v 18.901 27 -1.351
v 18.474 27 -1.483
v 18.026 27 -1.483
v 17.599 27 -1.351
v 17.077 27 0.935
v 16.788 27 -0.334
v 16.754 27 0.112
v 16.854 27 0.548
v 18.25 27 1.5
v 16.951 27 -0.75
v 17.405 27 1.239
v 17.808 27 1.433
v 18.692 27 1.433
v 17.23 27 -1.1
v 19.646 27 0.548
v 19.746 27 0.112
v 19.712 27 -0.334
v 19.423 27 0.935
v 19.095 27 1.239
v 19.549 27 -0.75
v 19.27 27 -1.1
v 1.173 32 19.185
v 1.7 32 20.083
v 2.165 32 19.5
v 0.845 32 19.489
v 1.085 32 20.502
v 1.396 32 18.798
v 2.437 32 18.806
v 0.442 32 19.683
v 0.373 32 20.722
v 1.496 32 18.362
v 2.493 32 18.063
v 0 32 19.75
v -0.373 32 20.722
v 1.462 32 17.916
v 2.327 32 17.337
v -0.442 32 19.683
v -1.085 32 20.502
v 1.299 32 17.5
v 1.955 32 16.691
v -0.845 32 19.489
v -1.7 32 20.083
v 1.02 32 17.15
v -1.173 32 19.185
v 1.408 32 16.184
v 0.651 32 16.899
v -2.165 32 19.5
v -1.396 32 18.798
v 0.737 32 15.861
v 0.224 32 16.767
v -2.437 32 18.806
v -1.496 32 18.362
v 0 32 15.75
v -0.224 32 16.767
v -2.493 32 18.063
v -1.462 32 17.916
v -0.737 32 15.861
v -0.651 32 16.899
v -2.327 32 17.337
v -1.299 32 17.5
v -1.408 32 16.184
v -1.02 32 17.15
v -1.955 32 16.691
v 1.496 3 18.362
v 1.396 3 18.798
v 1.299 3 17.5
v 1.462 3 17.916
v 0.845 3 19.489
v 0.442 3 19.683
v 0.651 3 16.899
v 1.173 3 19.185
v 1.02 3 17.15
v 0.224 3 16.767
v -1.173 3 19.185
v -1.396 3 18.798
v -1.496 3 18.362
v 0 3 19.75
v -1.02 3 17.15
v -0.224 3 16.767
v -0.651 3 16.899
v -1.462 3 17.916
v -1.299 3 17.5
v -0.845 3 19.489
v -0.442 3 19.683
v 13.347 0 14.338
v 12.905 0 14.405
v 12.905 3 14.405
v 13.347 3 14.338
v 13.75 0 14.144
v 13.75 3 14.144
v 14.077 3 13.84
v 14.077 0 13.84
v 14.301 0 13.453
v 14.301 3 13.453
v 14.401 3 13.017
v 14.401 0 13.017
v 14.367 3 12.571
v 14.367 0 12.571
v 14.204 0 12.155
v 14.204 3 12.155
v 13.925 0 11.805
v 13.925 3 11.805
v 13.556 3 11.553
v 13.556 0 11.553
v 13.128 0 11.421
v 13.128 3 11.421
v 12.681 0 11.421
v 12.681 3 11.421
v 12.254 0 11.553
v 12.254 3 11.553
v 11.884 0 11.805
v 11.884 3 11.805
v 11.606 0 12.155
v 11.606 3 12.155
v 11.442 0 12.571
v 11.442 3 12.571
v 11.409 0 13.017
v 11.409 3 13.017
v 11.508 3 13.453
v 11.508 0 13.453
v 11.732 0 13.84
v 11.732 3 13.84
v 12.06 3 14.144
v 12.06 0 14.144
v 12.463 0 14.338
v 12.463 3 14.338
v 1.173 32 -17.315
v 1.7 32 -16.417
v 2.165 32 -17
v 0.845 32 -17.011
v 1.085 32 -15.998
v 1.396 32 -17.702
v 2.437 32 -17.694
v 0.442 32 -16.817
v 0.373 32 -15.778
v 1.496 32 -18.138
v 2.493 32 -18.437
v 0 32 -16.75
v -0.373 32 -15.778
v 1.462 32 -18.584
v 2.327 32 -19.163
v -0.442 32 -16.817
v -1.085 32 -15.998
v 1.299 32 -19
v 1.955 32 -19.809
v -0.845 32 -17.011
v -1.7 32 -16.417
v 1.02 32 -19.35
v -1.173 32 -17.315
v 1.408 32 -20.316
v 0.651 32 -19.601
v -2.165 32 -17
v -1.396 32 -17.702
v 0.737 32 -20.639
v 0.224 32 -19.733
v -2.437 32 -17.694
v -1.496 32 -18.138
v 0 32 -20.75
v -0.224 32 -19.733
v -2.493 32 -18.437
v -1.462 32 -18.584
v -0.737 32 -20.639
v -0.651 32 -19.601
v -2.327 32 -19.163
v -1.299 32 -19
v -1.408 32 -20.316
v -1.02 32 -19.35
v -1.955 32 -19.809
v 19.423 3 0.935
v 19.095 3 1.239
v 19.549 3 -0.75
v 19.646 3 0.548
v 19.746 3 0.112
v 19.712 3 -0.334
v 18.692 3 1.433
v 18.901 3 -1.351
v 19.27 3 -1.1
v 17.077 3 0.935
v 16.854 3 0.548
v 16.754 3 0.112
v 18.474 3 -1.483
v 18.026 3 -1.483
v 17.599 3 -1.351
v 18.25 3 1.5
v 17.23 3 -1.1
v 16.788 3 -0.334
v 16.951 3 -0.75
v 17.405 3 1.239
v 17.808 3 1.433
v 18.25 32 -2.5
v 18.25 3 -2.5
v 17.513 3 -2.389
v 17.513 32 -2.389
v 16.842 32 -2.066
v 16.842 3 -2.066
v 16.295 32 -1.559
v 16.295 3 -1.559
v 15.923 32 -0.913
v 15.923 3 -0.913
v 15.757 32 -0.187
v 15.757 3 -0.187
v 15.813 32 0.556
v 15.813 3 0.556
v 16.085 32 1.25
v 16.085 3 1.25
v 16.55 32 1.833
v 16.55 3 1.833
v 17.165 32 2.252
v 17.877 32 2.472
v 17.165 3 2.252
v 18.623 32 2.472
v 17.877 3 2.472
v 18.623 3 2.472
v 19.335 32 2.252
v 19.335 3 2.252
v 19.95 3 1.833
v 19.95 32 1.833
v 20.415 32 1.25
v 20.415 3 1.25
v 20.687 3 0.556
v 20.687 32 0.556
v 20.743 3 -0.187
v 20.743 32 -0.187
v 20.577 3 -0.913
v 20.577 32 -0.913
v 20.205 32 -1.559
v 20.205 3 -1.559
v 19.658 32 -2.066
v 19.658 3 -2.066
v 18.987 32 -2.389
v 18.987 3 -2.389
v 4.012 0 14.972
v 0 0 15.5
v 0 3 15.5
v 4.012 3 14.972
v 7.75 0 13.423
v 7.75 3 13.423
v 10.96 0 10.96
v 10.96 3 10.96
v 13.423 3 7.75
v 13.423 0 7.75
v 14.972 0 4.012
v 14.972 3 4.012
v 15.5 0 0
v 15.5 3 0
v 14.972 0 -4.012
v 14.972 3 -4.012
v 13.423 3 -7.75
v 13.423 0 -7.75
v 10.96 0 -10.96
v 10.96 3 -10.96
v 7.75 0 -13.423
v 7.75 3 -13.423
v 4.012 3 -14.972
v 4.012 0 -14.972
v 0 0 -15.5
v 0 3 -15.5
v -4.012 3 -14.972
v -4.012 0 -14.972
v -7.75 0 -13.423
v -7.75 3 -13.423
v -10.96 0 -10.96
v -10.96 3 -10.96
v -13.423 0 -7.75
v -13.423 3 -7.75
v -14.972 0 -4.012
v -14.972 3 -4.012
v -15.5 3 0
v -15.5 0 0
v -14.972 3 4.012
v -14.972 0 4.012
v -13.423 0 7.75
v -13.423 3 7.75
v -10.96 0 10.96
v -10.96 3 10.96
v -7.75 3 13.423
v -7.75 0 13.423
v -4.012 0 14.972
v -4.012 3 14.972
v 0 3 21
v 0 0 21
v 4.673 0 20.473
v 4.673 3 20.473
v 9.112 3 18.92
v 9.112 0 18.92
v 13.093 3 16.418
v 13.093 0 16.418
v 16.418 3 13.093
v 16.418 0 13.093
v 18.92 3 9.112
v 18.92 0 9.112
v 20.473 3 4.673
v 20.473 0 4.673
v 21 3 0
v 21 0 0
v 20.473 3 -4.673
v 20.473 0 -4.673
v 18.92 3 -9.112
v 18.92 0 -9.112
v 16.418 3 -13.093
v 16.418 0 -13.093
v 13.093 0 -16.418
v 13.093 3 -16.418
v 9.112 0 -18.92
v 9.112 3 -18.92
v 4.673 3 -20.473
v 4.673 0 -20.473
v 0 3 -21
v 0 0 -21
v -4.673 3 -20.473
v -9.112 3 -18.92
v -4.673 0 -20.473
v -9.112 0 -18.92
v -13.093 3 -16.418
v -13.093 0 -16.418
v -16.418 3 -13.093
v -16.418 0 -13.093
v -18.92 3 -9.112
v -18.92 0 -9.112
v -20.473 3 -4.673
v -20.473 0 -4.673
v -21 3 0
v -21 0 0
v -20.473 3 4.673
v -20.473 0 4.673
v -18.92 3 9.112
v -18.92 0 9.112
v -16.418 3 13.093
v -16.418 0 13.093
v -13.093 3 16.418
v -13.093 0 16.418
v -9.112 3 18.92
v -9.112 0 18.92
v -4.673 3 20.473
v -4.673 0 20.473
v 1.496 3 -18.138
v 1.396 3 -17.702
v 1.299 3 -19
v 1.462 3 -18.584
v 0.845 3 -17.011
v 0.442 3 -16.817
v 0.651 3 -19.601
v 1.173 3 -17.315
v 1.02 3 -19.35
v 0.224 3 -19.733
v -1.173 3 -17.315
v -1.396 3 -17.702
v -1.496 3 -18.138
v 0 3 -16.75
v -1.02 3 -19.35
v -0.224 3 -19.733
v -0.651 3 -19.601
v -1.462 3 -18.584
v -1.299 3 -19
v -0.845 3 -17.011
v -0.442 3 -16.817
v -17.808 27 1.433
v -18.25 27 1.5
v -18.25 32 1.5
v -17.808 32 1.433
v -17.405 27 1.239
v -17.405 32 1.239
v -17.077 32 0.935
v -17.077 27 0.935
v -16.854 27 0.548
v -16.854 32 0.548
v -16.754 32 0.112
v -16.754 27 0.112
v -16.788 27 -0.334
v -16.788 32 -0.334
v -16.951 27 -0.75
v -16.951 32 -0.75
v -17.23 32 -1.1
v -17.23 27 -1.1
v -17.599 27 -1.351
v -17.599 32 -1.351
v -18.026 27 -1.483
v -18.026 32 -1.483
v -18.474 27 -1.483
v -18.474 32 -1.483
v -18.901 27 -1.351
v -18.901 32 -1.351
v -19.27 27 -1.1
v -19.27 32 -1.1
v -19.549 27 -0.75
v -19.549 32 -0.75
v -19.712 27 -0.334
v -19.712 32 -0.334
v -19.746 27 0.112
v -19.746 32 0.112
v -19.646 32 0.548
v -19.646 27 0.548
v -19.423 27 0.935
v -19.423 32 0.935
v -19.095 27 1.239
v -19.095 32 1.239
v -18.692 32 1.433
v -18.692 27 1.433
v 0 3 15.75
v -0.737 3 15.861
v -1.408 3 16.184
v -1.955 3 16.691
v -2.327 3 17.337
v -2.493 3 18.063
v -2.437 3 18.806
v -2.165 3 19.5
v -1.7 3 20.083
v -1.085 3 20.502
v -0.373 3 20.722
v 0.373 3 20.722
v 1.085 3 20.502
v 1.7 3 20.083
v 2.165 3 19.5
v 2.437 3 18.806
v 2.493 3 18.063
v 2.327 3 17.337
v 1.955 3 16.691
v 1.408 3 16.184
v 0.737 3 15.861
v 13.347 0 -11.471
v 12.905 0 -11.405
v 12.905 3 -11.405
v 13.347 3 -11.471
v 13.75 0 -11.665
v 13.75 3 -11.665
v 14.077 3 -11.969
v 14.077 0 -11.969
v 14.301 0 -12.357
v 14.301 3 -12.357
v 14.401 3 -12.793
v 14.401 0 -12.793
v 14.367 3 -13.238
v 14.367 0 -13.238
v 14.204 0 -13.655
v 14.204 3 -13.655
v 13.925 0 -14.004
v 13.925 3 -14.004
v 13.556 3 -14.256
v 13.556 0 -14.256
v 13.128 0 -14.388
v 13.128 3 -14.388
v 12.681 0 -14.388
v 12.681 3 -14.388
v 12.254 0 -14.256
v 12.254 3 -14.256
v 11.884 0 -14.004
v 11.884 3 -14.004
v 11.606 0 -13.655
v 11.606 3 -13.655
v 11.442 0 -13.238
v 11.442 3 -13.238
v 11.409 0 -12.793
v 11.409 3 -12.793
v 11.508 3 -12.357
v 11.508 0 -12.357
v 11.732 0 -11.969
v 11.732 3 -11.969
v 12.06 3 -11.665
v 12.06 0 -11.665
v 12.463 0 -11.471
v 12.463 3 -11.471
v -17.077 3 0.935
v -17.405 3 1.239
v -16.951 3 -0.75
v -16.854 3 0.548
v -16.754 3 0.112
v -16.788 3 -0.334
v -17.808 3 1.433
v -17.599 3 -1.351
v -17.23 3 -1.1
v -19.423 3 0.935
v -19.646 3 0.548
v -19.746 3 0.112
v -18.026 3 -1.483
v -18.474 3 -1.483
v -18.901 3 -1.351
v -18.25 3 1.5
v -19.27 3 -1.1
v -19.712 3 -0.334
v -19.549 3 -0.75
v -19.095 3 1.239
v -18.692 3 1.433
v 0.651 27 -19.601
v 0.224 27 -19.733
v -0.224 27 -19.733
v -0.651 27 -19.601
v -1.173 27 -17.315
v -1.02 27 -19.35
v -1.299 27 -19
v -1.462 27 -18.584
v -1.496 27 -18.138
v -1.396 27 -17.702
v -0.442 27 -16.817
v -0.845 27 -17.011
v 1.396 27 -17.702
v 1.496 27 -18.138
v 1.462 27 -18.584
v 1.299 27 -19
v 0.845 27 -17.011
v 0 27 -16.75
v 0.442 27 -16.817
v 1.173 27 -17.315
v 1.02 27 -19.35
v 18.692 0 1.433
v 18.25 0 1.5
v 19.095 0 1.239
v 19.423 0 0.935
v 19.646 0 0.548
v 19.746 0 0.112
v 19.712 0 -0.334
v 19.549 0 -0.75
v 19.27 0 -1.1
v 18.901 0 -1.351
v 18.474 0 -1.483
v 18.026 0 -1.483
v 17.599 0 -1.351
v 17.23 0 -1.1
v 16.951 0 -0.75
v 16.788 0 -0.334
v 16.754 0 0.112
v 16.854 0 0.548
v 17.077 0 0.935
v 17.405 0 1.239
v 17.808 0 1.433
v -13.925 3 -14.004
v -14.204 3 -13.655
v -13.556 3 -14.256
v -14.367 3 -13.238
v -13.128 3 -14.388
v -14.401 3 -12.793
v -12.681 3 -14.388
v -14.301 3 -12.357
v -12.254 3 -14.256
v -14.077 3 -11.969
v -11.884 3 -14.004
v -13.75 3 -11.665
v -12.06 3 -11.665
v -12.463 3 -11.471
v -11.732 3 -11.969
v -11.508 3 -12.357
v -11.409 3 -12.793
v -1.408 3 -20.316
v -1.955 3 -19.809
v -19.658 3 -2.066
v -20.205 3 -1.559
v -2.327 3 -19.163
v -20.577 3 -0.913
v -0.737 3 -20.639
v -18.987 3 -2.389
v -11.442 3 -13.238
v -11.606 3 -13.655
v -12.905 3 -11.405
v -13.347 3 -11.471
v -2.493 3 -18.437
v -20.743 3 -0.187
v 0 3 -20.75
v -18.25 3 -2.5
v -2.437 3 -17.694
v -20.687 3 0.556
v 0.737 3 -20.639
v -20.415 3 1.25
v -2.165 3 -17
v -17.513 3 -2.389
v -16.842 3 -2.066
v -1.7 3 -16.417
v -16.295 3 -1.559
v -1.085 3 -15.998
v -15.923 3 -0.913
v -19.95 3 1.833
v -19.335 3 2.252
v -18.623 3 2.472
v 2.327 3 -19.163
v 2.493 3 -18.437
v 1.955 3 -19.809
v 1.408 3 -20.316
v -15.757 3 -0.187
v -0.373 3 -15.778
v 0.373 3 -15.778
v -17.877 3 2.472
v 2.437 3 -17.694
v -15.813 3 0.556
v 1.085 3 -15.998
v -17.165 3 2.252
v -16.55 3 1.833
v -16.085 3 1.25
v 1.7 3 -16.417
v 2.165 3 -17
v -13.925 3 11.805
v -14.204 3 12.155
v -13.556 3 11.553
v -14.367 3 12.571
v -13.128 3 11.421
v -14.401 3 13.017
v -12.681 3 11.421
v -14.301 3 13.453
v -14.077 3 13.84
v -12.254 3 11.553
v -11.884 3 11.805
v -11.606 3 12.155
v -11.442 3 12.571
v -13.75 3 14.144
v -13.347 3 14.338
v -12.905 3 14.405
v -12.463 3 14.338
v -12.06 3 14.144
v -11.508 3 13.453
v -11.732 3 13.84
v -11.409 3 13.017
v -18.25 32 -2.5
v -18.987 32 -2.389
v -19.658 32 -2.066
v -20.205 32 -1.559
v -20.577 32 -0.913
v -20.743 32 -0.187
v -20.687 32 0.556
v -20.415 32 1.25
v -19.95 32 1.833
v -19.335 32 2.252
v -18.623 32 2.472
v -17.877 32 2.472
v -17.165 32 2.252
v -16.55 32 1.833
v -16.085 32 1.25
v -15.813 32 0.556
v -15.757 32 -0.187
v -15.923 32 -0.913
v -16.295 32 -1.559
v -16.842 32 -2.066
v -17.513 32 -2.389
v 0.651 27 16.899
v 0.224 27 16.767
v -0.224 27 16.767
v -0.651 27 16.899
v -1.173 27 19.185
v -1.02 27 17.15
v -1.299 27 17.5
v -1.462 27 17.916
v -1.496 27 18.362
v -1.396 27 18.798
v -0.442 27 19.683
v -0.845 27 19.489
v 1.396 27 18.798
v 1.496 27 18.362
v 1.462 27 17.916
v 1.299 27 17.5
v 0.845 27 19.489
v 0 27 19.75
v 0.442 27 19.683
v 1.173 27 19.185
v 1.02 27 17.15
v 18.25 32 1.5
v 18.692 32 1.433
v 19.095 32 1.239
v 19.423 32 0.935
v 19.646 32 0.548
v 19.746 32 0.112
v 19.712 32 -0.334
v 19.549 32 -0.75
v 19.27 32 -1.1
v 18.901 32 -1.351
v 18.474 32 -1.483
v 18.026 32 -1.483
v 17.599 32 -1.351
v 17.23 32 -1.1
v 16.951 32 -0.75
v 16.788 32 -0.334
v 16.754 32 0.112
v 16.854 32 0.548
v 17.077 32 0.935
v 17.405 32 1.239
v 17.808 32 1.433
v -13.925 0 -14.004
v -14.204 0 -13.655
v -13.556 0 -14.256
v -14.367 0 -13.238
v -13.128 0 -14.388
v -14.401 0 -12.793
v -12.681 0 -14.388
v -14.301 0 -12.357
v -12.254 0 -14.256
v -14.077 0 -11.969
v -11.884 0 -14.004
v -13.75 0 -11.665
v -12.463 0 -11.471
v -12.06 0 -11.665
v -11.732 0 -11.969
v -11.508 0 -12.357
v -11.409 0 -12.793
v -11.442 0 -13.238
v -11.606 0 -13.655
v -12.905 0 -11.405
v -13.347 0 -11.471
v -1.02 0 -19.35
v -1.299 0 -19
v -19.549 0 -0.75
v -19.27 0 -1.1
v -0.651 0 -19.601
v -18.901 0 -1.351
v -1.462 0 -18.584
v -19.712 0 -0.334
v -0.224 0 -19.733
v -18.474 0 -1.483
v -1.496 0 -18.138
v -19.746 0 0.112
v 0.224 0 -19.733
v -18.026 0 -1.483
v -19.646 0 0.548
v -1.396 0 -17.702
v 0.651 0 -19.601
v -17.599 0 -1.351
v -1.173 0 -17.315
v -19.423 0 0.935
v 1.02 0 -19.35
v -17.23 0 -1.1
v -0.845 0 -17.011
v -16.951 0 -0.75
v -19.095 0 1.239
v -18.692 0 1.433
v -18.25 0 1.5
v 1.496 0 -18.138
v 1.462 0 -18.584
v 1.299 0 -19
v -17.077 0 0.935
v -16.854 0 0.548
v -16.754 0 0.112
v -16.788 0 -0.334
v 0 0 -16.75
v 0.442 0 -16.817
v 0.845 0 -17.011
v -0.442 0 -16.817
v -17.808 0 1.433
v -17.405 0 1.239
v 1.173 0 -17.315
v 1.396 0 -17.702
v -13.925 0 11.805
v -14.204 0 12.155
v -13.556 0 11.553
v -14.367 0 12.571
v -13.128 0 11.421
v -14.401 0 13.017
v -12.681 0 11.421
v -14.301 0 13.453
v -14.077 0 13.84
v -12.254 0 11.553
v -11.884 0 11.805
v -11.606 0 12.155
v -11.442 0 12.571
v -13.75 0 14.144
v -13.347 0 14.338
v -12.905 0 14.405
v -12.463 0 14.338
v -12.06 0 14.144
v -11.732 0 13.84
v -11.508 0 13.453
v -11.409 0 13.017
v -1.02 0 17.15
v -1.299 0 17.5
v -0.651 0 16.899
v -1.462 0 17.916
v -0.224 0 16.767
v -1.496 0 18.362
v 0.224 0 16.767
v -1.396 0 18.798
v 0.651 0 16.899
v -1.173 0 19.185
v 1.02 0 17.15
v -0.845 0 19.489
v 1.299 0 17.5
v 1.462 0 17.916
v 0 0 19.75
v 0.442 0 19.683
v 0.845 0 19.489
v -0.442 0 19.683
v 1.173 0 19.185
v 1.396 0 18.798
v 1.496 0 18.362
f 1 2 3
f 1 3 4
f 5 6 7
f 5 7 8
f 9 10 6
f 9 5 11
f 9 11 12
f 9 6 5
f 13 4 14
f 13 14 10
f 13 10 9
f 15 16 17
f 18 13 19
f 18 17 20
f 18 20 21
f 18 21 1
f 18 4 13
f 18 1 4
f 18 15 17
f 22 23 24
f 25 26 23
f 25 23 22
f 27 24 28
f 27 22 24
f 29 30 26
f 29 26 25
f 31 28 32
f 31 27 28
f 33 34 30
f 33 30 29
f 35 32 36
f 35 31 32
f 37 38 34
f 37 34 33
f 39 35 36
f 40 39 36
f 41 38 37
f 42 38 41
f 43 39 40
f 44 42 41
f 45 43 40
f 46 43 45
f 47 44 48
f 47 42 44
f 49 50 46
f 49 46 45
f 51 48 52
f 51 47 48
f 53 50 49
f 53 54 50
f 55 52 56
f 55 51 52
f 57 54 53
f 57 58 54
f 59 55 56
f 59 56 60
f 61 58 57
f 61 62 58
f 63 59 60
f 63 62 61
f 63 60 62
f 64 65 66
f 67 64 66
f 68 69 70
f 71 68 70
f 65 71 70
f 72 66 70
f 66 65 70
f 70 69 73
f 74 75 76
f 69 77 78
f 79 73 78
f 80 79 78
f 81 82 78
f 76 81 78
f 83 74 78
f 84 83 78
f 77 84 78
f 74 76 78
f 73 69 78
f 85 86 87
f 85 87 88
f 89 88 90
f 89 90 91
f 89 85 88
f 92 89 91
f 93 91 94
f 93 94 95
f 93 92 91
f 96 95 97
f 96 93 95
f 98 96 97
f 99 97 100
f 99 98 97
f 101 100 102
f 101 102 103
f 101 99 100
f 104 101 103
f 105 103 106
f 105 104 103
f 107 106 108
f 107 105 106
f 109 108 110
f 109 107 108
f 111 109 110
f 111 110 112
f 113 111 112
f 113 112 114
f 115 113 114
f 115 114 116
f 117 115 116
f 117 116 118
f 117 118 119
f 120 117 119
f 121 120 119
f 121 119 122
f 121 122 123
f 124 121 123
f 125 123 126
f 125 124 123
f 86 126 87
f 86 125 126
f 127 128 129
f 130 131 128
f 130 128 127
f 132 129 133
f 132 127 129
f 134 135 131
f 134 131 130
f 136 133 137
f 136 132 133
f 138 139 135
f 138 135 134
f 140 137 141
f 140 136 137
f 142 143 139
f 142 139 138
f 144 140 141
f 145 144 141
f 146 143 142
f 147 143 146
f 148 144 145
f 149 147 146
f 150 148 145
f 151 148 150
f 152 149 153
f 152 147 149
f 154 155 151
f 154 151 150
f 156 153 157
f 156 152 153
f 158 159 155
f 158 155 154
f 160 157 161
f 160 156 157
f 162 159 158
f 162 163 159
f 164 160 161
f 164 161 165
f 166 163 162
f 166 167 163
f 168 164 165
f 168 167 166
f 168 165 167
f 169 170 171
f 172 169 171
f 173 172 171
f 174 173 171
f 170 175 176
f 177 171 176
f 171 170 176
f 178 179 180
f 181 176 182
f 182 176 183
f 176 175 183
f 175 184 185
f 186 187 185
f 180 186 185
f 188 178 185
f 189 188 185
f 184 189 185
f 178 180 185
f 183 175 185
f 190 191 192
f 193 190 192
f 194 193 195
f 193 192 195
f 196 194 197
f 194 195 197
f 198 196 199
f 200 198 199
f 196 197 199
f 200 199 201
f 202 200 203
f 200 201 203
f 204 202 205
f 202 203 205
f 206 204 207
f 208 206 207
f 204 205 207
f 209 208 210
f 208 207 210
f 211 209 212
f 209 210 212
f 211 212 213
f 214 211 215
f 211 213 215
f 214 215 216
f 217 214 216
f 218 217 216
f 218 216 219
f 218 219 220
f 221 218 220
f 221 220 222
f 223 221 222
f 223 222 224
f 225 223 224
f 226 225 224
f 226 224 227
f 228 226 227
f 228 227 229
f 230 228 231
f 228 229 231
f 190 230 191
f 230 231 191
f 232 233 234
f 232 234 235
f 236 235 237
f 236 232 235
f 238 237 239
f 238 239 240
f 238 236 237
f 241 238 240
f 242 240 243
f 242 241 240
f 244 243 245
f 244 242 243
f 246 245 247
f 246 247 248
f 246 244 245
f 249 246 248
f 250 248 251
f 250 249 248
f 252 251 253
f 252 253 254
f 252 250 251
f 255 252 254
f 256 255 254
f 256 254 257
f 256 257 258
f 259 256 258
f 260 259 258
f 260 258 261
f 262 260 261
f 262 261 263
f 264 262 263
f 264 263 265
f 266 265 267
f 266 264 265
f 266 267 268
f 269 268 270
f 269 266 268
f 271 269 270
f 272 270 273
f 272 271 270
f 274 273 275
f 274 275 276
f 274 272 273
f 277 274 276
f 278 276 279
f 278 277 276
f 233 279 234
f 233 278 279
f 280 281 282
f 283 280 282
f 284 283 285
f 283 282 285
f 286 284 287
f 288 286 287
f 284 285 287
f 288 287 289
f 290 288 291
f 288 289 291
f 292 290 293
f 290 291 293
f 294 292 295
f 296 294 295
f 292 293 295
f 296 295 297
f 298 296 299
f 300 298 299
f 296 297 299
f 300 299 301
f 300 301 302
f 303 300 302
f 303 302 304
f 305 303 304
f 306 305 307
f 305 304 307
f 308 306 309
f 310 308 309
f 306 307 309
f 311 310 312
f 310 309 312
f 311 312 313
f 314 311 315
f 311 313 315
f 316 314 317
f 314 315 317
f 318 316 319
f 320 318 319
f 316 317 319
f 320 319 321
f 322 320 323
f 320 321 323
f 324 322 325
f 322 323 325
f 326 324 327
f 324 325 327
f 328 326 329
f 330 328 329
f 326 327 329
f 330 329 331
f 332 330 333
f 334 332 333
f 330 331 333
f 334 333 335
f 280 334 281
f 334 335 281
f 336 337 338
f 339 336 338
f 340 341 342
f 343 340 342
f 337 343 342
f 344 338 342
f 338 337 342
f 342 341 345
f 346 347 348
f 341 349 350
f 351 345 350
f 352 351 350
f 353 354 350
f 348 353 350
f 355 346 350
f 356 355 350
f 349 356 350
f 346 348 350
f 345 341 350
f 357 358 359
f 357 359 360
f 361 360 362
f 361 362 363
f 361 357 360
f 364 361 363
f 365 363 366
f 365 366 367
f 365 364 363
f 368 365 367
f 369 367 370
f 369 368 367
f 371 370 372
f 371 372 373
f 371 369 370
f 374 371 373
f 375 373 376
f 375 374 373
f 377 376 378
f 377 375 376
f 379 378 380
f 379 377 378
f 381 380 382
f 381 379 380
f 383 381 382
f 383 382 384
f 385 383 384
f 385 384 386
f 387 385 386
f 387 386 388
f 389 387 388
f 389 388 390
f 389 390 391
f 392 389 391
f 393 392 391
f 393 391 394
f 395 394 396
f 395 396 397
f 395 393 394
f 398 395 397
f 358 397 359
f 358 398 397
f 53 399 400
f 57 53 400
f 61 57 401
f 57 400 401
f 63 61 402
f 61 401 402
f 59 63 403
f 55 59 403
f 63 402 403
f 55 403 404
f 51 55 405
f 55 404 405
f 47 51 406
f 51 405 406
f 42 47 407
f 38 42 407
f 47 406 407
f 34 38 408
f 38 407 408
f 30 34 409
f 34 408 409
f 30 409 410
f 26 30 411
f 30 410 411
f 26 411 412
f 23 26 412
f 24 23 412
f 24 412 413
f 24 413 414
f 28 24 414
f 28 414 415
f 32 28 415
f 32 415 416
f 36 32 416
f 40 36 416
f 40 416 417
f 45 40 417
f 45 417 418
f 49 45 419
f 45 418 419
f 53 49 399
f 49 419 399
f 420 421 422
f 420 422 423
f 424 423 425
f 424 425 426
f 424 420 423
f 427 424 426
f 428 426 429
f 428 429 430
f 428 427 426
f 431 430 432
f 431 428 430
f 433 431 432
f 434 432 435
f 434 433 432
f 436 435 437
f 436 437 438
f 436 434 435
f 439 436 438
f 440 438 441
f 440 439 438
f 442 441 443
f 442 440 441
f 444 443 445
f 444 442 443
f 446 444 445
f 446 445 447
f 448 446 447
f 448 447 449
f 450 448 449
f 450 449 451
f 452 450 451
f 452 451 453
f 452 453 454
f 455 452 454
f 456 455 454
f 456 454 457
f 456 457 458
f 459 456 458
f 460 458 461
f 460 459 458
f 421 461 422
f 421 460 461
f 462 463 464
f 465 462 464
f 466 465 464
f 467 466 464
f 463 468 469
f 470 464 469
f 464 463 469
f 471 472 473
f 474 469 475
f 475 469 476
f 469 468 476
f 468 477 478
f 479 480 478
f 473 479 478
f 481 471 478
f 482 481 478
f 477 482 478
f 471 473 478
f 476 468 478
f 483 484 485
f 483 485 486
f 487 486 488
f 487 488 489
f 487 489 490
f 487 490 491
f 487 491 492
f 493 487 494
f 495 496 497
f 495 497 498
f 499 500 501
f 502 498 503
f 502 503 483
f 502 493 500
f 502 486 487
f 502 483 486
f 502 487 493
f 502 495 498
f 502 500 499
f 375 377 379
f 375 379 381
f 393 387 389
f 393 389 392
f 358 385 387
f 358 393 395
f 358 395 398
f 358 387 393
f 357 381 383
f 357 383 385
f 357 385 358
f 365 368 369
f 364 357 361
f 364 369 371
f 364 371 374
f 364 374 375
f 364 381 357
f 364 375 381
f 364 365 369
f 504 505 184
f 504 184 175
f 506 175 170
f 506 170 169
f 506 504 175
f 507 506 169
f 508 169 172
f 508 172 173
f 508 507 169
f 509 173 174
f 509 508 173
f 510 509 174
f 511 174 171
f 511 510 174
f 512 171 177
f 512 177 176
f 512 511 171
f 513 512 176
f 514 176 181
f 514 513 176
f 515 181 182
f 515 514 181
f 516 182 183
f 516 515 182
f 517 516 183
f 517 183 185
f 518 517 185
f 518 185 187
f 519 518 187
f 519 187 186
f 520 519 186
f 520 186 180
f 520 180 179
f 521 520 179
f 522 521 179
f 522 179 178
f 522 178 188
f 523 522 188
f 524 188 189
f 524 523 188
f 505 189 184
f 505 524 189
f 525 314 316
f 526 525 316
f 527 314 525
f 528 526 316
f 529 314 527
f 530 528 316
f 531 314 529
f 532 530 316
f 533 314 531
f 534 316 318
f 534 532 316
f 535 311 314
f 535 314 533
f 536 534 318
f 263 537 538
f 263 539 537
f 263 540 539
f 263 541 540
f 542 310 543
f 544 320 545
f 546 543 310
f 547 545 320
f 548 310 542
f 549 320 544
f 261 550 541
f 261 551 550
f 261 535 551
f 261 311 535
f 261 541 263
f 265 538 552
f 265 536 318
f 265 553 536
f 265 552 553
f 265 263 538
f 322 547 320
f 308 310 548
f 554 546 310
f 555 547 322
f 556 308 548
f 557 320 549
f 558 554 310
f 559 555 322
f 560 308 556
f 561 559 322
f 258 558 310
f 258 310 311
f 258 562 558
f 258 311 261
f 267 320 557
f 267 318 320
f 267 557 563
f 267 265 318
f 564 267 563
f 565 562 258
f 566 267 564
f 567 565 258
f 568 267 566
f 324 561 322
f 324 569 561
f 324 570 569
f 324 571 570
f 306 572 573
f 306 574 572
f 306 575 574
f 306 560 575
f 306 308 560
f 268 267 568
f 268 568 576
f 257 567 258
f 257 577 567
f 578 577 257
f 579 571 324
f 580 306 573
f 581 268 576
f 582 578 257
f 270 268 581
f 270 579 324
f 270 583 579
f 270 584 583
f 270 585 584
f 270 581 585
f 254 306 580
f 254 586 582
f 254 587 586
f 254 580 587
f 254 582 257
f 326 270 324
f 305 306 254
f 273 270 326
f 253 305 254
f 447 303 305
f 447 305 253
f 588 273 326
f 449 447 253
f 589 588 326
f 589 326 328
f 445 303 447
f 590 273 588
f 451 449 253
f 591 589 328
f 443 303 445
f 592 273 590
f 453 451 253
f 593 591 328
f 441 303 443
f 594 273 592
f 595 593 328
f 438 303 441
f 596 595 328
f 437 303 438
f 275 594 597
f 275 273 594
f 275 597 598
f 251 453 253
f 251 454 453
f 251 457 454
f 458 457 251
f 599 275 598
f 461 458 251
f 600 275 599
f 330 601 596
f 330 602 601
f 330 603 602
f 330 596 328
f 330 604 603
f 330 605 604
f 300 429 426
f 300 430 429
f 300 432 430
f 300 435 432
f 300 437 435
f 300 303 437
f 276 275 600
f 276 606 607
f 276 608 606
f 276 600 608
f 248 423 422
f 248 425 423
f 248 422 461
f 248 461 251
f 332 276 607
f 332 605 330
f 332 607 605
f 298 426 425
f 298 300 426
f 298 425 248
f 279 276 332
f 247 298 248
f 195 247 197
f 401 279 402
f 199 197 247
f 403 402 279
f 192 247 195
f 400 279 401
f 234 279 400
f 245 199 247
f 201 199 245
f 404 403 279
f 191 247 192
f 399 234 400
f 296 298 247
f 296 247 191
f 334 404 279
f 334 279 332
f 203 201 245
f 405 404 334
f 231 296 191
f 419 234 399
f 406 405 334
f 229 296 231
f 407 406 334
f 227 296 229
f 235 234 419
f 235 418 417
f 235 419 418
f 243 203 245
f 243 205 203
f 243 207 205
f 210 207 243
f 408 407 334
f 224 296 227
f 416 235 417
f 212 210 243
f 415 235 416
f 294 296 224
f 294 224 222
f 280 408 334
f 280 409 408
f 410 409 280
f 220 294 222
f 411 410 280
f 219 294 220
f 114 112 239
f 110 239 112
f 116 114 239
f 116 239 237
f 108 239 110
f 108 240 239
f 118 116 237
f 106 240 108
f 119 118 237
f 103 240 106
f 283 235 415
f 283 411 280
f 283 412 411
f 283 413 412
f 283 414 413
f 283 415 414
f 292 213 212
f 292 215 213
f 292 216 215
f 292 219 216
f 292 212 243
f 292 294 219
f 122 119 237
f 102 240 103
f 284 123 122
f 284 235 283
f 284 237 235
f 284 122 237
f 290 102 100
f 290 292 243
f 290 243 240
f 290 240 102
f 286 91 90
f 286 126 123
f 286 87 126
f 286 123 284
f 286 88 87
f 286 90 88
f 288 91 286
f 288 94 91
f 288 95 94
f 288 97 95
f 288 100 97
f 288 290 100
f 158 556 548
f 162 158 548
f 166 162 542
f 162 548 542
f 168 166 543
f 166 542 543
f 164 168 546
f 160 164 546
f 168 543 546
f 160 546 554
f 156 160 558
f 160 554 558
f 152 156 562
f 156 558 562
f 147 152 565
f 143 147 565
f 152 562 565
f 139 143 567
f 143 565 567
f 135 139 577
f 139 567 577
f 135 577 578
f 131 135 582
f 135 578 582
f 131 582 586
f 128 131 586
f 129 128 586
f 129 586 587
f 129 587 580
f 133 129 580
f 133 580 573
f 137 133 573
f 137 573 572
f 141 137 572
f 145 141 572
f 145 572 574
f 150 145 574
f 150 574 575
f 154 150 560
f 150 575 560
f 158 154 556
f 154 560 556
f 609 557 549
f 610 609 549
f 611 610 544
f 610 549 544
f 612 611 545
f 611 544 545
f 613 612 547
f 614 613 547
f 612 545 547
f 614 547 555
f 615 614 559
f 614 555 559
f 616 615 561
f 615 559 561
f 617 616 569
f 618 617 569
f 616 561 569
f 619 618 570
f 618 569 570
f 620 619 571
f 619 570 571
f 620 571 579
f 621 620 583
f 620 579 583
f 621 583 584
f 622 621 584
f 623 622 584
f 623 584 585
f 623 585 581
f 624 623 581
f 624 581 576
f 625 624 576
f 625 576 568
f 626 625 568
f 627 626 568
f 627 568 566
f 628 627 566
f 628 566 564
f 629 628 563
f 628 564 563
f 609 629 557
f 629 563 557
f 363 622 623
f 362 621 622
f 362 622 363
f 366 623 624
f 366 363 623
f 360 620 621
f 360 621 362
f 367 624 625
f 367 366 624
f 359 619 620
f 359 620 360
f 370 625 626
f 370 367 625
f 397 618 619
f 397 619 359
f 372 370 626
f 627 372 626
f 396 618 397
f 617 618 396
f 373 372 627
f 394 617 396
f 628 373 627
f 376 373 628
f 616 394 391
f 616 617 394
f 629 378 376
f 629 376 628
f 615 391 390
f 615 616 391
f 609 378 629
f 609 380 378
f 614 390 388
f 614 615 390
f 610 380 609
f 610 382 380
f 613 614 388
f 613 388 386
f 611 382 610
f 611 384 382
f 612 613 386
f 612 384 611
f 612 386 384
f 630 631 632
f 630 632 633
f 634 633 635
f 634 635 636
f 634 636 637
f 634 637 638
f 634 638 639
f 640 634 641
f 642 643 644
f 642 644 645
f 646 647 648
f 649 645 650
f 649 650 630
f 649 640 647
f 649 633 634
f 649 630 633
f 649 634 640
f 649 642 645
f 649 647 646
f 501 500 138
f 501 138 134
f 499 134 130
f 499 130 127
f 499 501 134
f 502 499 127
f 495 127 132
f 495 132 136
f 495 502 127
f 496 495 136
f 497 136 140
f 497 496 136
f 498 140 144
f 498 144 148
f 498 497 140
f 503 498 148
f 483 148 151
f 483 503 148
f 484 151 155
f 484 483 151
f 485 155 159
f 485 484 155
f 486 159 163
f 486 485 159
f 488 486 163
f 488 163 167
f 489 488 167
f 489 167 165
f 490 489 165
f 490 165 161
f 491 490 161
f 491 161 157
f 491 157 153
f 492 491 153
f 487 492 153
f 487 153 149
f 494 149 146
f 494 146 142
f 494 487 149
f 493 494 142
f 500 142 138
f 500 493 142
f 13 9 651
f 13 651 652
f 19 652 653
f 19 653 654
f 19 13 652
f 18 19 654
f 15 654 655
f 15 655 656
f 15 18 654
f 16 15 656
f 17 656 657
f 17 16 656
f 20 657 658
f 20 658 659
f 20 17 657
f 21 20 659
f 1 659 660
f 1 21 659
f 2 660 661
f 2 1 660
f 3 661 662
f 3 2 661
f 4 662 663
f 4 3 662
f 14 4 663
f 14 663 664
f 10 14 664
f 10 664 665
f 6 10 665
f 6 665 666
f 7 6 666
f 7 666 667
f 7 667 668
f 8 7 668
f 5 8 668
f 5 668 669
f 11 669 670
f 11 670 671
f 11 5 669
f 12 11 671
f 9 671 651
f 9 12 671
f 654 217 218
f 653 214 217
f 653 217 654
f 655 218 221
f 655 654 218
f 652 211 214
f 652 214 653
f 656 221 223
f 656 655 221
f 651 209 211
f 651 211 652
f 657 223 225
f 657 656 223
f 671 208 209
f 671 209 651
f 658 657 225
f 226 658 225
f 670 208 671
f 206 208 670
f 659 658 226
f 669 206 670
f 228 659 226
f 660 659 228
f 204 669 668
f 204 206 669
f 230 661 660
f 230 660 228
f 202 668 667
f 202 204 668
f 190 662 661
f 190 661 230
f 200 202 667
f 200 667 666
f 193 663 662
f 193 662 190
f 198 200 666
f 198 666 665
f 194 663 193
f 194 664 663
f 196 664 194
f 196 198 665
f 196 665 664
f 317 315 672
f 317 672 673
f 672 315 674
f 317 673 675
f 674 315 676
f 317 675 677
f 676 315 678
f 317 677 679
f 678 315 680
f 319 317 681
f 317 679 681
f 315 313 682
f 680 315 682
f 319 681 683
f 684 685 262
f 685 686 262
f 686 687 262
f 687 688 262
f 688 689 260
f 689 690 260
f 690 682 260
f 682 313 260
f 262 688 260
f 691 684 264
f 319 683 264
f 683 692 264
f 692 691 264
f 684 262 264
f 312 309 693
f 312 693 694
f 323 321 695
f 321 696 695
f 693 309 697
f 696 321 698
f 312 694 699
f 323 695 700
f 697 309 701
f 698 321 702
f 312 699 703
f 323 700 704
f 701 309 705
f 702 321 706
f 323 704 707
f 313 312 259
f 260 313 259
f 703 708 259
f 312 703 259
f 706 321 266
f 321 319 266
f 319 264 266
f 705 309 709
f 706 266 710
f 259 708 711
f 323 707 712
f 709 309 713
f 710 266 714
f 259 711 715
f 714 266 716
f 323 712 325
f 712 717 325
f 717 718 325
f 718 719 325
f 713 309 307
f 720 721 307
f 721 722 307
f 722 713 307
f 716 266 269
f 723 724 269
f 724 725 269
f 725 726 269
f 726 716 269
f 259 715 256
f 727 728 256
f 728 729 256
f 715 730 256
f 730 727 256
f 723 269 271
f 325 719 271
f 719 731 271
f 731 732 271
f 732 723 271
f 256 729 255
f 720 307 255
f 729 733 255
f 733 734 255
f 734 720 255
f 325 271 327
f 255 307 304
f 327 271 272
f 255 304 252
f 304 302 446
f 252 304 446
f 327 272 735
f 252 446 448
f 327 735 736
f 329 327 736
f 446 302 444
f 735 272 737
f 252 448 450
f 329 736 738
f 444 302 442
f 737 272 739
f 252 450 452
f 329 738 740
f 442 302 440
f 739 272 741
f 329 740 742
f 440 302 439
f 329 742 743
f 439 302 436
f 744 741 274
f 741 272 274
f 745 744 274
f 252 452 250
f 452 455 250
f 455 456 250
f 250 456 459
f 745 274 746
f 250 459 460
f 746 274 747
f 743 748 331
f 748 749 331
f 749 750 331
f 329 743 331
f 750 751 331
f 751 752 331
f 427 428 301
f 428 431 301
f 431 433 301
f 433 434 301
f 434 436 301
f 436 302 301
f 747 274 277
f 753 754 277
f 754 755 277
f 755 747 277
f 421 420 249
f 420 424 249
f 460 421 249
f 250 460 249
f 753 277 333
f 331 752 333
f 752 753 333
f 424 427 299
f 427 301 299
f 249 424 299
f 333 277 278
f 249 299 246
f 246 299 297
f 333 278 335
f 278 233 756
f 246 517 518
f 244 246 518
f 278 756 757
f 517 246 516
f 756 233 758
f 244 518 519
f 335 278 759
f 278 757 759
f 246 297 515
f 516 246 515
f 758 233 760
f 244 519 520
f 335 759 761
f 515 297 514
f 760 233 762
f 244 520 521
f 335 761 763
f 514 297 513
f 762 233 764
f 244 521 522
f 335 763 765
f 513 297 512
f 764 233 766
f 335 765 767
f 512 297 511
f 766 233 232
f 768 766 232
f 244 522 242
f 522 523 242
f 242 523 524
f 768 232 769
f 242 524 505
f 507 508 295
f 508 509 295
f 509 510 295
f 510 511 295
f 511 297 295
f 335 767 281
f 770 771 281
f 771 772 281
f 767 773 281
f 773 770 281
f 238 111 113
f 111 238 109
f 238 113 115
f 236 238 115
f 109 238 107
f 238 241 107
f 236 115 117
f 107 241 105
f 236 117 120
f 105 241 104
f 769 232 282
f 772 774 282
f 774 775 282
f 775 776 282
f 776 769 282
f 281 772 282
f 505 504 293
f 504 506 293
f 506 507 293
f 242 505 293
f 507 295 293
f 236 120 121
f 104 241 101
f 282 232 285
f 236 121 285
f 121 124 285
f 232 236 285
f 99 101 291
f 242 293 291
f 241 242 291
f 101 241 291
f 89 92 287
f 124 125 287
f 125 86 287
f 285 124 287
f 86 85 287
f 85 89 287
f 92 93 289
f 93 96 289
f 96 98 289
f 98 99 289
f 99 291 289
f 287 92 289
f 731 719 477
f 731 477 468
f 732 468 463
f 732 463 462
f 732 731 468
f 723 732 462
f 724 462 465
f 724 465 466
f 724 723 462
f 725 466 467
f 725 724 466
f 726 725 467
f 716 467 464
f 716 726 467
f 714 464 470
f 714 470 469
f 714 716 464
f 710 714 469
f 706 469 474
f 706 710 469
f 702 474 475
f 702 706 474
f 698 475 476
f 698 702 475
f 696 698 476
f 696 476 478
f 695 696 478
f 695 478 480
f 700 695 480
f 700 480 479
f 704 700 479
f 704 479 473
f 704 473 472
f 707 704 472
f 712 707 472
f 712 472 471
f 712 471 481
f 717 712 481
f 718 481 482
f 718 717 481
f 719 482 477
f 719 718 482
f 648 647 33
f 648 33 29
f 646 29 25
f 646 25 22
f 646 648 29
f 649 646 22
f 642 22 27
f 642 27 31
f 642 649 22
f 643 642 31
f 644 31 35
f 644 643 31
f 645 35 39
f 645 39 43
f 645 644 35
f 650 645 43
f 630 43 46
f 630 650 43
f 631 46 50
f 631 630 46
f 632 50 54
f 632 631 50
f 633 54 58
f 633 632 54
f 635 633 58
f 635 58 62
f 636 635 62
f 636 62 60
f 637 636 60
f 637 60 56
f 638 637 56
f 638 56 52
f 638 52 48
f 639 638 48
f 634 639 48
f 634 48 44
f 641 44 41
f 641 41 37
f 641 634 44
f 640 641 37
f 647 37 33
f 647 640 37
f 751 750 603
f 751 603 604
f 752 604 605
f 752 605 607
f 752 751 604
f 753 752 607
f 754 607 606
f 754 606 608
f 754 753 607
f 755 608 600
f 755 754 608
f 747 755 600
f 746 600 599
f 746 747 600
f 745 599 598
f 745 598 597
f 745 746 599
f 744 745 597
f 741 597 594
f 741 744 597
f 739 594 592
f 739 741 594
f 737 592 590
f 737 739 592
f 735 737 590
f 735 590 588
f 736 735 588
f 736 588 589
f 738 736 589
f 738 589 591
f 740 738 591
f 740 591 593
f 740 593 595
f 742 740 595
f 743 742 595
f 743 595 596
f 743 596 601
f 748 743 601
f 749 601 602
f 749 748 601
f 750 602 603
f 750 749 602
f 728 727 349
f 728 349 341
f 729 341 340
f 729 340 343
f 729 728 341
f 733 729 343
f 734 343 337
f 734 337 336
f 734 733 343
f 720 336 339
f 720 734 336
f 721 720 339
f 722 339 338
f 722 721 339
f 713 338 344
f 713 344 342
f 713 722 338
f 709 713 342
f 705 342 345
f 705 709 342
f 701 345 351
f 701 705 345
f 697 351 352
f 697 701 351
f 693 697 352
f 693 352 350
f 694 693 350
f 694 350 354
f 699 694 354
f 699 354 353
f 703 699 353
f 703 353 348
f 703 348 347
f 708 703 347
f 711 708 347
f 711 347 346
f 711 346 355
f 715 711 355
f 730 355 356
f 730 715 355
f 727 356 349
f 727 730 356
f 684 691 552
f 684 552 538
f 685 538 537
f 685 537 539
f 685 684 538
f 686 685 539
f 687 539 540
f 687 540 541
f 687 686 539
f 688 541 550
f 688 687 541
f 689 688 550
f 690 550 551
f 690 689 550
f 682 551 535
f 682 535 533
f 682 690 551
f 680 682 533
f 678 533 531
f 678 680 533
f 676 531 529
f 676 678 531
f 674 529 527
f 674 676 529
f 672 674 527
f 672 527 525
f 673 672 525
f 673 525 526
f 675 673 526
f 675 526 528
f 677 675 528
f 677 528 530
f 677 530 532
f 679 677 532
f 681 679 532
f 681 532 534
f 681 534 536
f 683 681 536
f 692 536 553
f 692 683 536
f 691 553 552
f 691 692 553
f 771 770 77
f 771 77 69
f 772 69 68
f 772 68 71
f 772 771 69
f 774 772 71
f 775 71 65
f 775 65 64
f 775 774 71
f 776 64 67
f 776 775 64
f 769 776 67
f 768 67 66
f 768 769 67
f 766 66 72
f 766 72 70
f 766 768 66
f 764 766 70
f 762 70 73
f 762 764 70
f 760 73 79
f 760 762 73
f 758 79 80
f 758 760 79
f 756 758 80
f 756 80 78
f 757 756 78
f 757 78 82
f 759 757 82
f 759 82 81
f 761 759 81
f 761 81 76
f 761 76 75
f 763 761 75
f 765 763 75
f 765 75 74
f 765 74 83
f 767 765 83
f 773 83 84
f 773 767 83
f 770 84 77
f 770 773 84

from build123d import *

# Parameters (mm, degrees)
SKETCH1_R           = 21
SKETCH1_R_2         = 15.5
SKETCH1_R_3         = 1.5
BOSS_EXTRUDE1_DEPTH = 3
SKETCH2_R           = 2.5
BOSS_EXTRUDE2_DEPTH = 29
CUT_EXTRUDE1_START  = -5
SKETCH3_R           = 1.5
CUT_EXTRUDE1_DEPTH  = 5


with BuildPart() as part:
    # Sketch1 → Boss-Extrude1 (new body)
    with BuildSketch(Plane(origin=(0, 0, 0), x_dir=(1, 0, 0), z_dir=(0, 1, 0))):
        with Locations(Location((0, 0, 0), (0, 0, 270))):
            Circle(SKETCH1_R)
        with Locations(Location((0, 0, 0), (0, 0, 270))):
            Circle(SKETCH1_R_2, mode=Mode.SUBTRACT)
        with Locations(Location((0, 18.25, 0), (0, 0, 270))):
            Circle(SKETCH1_R_3, mode=Mode.SUBTRACT)
        with Locations(Location((12.904698757, 12.904698757, 0), (0, 0, 270))):
            Circle(SKETCH1_R_3, mode=Mode.SUBTRACT)
        with Locations(Location((18.25, 0, 0), (0, 0, 270))):
            Circle(SKETCH1_R_3, mode=Mode.SUBTRACT)
        with Locations(Location((12.904698757, -12.904698757, 0), (0, 0, 270))):
            Circle(SKETCH1_R_3, mode=Mode.SUBTRACT)
        with Locations(Location((0, -18.25, 0), (0, 0, 270))):
            Circle(SKETCH1_R_3, mode=Mode.SUBTRACT)
        with Locations(Location((-12.904698757, -12.904698757, 0), (0, 0, 270))):
            Circle(SKETCH1_R_3, mode=Mode.SUBTRACT)
        with Locations(Location((-18.25, 0, 0), (0, 0, 270))):
            Circle(SKETCH1_R_3, mode=Mode.SUBTRACT)
        with Locations(Location((-12.904698757, 12.904698757, 0), (0, 0, 270))):
            Circle(SKETCH1_R_3, mode=Mode.SUBTRACT)
    extrude(amount=BOSS_EXTRUDE1_DEPTH)

    # Sketch2 → Boss-Extrude2 (add)
    with BuildSketch(Plane(origin=(0, 3, 0), x_dir=(1, 0, 0), z_dir=(0, 1, 0))):
        with Locations(Location((0, 18.25, 0), (0, 0, 90))):
            Circle(SKETCH2_R)
        with Locations(Location((18.25, 0, 0), (0, 0, 90))):
            Circle(SKETCH2_R)
        with Locations(Location((0, -18.25, 0), (0, 0, 90))):
            Circle(SKETCH2_R)
        with Locations(Location((-18.25, 0, 0), (0, 0, 90))):
            Circle(SKETCH2_R)
    extrude(amount=BOSS_EXTRUDE2_DEPTH)

    # Sketch3 → Cut-Extrude1 (cut)
    with BuildSketch(Plane(origin=(0, 32, 0), x_dir=(1, 0, 0), z_dir=(0, 1, 0)).offset(CUT_EXTRUDE1_START)):
        with Locations(Location((18.25, 0, 0), (0, 0, 270))):
            Circle(SKETCH3_R)
        with Locations(Location((0, 18.25, 0), (0, 0, 270))):
            Circle(SKETCH3_R)
        with Locations(Location((0, -18.25, 0), (0, 0, 270))):
            Circle(SKETCH3_R)
        with Locations(Location((-18.25, 0, 0), (0, 0, 270))):
            Circle(SKETCH3_R)
    extrude(amount=CUT_EXTRUDE1_DEPTH, mode=Mode.SUBTRACT)


solid = part.part
